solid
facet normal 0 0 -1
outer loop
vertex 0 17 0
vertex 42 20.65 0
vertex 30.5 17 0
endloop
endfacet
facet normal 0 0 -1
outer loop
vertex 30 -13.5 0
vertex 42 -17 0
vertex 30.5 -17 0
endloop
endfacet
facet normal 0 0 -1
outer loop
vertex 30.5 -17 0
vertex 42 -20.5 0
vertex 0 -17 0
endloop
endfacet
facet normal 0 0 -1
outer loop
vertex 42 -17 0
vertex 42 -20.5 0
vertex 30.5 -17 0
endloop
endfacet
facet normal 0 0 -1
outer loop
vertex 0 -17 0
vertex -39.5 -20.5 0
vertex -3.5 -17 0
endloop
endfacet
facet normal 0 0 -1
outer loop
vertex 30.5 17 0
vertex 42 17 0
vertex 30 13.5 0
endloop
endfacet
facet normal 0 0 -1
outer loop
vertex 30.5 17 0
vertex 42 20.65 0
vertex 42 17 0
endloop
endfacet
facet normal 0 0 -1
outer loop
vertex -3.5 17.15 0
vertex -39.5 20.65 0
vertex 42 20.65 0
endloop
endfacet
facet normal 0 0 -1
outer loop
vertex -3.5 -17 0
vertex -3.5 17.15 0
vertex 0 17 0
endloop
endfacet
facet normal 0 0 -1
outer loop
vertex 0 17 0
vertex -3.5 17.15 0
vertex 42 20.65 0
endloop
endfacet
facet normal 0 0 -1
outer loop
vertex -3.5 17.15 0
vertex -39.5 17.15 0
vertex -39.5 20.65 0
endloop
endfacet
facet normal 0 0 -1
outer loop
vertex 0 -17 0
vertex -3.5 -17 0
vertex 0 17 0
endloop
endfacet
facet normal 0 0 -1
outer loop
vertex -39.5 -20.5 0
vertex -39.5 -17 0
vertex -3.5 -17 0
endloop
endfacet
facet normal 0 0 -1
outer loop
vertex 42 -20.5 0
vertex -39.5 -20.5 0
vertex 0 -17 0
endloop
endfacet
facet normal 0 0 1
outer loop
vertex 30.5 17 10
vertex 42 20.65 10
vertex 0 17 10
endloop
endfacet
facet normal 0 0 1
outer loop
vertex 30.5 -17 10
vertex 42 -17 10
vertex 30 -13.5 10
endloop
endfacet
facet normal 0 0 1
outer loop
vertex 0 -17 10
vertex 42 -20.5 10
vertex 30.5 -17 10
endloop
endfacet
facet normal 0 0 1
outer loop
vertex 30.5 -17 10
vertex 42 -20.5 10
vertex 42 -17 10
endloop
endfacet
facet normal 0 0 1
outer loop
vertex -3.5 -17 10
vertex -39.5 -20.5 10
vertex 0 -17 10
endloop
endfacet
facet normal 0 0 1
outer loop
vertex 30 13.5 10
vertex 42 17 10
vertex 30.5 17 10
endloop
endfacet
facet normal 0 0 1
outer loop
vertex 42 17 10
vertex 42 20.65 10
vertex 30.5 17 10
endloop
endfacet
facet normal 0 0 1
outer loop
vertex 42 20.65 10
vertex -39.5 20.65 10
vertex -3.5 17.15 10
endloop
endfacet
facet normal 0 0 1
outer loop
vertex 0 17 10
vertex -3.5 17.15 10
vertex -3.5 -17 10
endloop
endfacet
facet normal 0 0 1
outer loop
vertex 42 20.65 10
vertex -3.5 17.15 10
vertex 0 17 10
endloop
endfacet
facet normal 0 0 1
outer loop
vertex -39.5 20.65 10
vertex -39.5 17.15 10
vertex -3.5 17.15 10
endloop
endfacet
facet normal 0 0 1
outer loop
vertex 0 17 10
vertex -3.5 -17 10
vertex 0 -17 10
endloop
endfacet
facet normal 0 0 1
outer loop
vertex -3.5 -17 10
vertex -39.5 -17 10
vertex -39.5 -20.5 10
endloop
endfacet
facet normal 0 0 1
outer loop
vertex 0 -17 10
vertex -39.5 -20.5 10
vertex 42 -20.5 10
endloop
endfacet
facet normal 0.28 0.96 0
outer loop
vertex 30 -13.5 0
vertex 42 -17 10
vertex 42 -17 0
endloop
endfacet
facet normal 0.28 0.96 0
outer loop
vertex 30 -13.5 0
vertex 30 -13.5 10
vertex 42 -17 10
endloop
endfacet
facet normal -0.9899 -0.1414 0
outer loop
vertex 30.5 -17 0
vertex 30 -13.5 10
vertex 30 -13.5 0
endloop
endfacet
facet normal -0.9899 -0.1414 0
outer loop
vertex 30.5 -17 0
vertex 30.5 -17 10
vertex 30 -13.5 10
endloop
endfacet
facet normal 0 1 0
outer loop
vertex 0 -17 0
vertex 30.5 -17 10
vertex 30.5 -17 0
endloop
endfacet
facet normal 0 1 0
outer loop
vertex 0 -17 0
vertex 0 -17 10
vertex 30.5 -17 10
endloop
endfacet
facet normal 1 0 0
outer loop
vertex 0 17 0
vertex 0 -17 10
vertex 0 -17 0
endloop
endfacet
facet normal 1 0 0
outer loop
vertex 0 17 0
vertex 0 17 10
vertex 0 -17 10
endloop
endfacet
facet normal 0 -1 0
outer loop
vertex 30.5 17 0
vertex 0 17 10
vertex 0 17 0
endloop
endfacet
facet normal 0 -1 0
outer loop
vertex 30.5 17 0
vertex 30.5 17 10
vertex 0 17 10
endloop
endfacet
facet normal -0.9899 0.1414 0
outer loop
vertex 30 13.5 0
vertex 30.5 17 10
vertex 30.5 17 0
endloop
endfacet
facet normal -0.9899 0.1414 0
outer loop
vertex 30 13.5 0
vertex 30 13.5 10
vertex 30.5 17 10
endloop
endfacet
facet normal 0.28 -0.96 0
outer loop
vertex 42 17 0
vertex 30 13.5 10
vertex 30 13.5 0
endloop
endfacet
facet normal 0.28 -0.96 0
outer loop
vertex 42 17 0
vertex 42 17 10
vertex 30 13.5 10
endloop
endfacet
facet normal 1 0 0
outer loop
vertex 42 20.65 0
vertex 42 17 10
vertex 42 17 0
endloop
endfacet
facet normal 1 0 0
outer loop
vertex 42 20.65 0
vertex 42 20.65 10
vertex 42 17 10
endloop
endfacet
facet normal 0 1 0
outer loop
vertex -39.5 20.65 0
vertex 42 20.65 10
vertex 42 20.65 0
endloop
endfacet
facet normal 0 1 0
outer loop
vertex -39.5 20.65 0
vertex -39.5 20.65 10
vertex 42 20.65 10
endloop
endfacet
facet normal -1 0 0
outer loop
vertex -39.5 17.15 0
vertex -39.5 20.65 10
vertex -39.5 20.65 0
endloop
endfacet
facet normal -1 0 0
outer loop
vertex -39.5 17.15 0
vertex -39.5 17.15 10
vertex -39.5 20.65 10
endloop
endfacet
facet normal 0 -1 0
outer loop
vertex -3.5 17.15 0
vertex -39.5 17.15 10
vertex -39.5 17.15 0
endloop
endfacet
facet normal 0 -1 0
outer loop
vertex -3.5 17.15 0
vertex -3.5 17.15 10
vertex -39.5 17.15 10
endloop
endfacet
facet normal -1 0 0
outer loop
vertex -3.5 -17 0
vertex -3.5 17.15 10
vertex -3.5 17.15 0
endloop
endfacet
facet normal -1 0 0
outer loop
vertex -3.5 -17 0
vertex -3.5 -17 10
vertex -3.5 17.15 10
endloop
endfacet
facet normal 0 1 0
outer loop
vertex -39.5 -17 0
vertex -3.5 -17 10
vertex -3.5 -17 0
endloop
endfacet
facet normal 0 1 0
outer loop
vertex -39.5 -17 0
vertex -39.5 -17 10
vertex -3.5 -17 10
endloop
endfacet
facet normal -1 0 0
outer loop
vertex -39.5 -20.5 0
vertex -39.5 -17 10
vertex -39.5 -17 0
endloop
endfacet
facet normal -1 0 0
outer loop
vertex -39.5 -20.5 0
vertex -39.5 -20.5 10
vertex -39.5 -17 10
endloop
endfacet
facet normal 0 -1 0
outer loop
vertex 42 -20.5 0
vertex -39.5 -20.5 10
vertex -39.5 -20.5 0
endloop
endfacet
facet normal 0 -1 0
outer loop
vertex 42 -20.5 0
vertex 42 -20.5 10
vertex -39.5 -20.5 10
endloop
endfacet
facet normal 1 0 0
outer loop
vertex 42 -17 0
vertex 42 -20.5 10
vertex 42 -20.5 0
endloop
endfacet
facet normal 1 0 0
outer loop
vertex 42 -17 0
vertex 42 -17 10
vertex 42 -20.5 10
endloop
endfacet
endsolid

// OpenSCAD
translate([0,-17,0]) linear_extrude(10) {
    polygon([[0,0],[30.5,0],[30,3.5],[42,0],[42,-3.5],[-39.5,-3.5],[-39.5,0],[-3.5,0],[-3.5,34.15],[-39.5,34.15],[-39.5,37.65],[-3.5,37.65],[42,37.65],[42,34],[30,30.5],[30.5,34],[0,34]]);
}
